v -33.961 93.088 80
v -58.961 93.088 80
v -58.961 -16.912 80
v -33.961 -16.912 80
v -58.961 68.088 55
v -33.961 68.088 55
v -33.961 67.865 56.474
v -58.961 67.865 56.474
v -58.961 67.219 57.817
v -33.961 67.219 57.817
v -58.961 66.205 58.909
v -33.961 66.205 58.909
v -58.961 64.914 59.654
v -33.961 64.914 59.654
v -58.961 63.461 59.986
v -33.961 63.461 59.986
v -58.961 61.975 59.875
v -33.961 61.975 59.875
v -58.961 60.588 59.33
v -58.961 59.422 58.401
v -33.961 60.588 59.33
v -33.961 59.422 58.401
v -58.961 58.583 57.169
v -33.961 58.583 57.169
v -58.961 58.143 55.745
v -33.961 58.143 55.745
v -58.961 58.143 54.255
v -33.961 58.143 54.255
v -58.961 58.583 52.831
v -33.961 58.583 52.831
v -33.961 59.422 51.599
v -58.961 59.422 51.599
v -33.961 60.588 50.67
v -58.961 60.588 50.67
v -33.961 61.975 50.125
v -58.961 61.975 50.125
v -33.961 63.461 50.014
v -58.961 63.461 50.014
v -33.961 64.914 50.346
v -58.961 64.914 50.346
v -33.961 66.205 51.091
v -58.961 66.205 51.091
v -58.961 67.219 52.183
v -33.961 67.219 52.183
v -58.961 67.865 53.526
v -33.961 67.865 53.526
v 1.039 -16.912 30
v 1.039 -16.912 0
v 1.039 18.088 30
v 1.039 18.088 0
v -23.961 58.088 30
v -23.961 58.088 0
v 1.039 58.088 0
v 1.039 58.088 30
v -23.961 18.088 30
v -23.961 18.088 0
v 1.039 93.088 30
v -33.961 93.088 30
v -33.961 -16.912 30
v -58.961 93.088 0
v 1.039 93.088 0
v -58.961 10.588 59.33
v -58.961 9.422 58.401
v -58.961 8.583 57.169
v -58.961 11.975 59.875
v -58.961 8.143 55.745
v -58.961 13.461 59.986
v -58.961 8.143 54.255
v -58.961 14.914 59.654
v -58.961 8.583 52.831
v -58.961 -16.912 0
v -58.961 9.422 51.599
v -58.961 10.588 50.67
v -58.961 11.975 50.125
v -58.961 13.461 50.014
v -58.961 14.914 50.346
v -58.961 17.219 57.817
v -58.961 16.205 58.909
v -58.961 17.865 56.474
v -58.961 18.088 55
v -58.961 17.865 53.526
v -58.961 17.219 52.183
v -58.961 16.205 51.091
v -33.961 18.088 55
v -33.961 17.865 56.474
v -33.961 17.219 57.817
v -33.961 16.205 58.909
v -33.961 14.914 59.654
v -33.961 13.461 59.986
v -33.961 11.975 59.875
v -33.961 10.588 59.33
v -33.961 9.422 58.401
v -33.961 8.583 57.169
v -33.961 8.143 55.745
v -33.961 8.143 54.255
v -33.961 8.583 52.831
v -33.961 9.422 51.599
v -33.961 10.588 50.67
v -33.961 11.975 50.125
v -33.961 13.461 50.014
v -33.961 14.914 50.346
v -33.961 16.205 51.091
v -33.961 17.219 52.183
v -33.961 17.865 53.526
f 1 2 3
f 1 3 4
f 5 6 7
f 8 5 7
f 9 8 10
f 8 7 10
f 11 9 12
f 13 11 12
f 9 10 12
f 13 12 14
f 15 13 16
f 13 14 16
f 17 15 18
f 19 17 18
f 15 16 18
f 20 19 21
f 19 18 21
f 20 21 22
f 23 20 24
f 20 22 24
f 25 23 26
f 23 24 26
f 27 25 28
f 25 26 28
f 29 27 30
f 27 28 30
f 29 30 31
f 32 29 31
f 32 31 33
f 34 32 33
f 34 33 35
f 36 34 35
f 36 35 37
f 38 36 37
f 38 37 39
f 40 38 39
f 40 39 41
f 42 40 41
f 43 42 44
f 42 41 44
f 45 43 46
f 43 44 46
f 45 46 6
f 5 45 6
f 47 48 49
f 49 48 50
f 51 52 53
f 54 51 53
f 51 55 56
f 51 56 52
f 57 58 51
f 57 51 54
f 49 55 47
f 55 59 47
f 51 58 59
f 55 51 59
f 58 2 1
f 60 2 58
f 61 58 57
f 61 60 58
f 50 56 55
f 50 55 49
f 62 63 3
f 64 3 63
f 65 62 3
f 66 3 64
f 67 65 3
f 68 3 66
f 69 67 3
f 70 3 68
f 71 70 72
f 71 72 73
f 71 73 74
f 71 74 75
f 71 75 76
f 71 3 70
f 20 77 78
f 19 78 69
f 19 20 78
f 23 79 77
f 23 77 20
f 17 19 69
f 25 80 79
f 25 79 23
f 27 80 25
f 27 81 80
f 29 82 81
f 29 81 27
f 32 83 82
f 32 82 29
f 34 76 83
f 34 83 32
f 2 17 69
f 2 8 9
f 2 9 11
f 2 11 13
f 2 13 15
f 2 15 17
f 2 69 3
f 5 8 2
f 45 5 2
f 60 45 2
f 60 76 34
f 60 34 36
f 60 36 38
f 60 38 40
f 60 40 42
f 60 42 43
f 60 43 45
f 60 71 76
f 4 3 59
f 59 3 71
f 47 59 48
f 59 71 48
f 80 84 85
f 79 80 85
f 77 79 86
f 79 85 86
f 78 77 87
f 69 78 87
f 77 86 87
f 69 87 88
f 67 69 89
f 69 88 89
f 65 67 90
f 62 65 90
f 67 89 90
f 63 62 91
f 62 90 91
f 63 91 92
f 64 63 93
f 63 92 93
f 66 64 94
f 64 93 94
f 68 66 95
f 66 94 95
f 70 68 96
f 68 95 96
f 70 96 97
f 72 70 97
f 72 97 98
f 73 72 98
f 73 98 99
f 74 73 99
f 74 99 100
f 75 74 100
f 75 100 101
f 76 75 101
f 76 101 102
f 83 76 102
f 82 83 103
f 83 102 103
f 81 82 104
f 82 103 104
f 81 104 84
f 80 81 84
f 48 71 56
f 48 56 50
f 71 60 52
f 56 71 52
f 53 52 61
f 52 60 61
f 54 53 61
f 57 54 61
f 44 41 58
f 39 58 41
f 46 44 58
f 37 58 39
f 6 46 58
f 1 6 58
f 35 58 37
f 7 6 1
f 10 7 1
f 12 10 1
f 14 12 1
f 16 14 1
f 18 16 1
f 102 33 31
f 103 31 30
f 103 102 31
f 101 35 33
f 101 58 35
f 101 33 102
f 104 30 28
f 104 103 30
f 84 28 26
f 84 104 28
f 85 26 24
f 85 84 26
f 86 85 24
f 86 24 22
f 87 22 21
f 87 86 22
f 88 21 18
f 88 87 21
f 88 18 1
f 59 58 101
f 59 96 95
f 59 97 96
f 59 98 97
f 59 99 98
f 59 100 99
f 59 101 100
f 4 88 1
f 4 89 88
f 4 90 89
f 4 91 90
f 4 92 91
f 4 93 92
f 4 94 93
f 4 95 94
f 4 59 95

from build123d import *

# Parameters (mm, degrees)
F0_W     = 60
F0_H     = 110
F1_DEPTH = 80
F2_W     = 35
F2_H     = 50
F3_DEPTH = 110
F4_W     = 25
F4_H     = 40
F5_DEPTH = 30
F6_R     = 5
F7_DEPTH = 25


with BuildPart() as f1:
    # F0 (on Top) → F1 (new body)
    with BuildSketch(Plane.XY):
        with Locations((-28.960537, 38.087605)):
            Rectangle(F0_W, F0_H)
    extrude(amount=F1_DEPTH)

    # F2 (on face) → F3 (cut)
    with BuildSketch(Plane.XZ.offset(16.912395)):
        with Locations((-16.460537, 55)):
            Rectangle(F2_W, F2_H)
    extrude(amount=-F3_DEPTH, mode=Mode.SUBTRACT)

    # F4 (on face) → F5 (cut)
    with BuildSketch(Plane.XY.offset(30)):
        with Locations((-11.460537, 38.087605)):
            Rectangle(F4_W, F4_H)
    extrude(amount=-F5_DEPTH, mode=Mode.SUBTRACT)

    # F6 (on face) → F7 (cut)
    with BuildSketch(Plane.YZ.offset(-33.960537)):
        with Locations((13.087605, 55)):
            Circle(F6_R)
        with Locations((63.087605, 55)):
            Circle(F6_R)
    extrude(amount=-F7_DEPTH, mode=Mode.SUBTRACT)


solid = f1.part
